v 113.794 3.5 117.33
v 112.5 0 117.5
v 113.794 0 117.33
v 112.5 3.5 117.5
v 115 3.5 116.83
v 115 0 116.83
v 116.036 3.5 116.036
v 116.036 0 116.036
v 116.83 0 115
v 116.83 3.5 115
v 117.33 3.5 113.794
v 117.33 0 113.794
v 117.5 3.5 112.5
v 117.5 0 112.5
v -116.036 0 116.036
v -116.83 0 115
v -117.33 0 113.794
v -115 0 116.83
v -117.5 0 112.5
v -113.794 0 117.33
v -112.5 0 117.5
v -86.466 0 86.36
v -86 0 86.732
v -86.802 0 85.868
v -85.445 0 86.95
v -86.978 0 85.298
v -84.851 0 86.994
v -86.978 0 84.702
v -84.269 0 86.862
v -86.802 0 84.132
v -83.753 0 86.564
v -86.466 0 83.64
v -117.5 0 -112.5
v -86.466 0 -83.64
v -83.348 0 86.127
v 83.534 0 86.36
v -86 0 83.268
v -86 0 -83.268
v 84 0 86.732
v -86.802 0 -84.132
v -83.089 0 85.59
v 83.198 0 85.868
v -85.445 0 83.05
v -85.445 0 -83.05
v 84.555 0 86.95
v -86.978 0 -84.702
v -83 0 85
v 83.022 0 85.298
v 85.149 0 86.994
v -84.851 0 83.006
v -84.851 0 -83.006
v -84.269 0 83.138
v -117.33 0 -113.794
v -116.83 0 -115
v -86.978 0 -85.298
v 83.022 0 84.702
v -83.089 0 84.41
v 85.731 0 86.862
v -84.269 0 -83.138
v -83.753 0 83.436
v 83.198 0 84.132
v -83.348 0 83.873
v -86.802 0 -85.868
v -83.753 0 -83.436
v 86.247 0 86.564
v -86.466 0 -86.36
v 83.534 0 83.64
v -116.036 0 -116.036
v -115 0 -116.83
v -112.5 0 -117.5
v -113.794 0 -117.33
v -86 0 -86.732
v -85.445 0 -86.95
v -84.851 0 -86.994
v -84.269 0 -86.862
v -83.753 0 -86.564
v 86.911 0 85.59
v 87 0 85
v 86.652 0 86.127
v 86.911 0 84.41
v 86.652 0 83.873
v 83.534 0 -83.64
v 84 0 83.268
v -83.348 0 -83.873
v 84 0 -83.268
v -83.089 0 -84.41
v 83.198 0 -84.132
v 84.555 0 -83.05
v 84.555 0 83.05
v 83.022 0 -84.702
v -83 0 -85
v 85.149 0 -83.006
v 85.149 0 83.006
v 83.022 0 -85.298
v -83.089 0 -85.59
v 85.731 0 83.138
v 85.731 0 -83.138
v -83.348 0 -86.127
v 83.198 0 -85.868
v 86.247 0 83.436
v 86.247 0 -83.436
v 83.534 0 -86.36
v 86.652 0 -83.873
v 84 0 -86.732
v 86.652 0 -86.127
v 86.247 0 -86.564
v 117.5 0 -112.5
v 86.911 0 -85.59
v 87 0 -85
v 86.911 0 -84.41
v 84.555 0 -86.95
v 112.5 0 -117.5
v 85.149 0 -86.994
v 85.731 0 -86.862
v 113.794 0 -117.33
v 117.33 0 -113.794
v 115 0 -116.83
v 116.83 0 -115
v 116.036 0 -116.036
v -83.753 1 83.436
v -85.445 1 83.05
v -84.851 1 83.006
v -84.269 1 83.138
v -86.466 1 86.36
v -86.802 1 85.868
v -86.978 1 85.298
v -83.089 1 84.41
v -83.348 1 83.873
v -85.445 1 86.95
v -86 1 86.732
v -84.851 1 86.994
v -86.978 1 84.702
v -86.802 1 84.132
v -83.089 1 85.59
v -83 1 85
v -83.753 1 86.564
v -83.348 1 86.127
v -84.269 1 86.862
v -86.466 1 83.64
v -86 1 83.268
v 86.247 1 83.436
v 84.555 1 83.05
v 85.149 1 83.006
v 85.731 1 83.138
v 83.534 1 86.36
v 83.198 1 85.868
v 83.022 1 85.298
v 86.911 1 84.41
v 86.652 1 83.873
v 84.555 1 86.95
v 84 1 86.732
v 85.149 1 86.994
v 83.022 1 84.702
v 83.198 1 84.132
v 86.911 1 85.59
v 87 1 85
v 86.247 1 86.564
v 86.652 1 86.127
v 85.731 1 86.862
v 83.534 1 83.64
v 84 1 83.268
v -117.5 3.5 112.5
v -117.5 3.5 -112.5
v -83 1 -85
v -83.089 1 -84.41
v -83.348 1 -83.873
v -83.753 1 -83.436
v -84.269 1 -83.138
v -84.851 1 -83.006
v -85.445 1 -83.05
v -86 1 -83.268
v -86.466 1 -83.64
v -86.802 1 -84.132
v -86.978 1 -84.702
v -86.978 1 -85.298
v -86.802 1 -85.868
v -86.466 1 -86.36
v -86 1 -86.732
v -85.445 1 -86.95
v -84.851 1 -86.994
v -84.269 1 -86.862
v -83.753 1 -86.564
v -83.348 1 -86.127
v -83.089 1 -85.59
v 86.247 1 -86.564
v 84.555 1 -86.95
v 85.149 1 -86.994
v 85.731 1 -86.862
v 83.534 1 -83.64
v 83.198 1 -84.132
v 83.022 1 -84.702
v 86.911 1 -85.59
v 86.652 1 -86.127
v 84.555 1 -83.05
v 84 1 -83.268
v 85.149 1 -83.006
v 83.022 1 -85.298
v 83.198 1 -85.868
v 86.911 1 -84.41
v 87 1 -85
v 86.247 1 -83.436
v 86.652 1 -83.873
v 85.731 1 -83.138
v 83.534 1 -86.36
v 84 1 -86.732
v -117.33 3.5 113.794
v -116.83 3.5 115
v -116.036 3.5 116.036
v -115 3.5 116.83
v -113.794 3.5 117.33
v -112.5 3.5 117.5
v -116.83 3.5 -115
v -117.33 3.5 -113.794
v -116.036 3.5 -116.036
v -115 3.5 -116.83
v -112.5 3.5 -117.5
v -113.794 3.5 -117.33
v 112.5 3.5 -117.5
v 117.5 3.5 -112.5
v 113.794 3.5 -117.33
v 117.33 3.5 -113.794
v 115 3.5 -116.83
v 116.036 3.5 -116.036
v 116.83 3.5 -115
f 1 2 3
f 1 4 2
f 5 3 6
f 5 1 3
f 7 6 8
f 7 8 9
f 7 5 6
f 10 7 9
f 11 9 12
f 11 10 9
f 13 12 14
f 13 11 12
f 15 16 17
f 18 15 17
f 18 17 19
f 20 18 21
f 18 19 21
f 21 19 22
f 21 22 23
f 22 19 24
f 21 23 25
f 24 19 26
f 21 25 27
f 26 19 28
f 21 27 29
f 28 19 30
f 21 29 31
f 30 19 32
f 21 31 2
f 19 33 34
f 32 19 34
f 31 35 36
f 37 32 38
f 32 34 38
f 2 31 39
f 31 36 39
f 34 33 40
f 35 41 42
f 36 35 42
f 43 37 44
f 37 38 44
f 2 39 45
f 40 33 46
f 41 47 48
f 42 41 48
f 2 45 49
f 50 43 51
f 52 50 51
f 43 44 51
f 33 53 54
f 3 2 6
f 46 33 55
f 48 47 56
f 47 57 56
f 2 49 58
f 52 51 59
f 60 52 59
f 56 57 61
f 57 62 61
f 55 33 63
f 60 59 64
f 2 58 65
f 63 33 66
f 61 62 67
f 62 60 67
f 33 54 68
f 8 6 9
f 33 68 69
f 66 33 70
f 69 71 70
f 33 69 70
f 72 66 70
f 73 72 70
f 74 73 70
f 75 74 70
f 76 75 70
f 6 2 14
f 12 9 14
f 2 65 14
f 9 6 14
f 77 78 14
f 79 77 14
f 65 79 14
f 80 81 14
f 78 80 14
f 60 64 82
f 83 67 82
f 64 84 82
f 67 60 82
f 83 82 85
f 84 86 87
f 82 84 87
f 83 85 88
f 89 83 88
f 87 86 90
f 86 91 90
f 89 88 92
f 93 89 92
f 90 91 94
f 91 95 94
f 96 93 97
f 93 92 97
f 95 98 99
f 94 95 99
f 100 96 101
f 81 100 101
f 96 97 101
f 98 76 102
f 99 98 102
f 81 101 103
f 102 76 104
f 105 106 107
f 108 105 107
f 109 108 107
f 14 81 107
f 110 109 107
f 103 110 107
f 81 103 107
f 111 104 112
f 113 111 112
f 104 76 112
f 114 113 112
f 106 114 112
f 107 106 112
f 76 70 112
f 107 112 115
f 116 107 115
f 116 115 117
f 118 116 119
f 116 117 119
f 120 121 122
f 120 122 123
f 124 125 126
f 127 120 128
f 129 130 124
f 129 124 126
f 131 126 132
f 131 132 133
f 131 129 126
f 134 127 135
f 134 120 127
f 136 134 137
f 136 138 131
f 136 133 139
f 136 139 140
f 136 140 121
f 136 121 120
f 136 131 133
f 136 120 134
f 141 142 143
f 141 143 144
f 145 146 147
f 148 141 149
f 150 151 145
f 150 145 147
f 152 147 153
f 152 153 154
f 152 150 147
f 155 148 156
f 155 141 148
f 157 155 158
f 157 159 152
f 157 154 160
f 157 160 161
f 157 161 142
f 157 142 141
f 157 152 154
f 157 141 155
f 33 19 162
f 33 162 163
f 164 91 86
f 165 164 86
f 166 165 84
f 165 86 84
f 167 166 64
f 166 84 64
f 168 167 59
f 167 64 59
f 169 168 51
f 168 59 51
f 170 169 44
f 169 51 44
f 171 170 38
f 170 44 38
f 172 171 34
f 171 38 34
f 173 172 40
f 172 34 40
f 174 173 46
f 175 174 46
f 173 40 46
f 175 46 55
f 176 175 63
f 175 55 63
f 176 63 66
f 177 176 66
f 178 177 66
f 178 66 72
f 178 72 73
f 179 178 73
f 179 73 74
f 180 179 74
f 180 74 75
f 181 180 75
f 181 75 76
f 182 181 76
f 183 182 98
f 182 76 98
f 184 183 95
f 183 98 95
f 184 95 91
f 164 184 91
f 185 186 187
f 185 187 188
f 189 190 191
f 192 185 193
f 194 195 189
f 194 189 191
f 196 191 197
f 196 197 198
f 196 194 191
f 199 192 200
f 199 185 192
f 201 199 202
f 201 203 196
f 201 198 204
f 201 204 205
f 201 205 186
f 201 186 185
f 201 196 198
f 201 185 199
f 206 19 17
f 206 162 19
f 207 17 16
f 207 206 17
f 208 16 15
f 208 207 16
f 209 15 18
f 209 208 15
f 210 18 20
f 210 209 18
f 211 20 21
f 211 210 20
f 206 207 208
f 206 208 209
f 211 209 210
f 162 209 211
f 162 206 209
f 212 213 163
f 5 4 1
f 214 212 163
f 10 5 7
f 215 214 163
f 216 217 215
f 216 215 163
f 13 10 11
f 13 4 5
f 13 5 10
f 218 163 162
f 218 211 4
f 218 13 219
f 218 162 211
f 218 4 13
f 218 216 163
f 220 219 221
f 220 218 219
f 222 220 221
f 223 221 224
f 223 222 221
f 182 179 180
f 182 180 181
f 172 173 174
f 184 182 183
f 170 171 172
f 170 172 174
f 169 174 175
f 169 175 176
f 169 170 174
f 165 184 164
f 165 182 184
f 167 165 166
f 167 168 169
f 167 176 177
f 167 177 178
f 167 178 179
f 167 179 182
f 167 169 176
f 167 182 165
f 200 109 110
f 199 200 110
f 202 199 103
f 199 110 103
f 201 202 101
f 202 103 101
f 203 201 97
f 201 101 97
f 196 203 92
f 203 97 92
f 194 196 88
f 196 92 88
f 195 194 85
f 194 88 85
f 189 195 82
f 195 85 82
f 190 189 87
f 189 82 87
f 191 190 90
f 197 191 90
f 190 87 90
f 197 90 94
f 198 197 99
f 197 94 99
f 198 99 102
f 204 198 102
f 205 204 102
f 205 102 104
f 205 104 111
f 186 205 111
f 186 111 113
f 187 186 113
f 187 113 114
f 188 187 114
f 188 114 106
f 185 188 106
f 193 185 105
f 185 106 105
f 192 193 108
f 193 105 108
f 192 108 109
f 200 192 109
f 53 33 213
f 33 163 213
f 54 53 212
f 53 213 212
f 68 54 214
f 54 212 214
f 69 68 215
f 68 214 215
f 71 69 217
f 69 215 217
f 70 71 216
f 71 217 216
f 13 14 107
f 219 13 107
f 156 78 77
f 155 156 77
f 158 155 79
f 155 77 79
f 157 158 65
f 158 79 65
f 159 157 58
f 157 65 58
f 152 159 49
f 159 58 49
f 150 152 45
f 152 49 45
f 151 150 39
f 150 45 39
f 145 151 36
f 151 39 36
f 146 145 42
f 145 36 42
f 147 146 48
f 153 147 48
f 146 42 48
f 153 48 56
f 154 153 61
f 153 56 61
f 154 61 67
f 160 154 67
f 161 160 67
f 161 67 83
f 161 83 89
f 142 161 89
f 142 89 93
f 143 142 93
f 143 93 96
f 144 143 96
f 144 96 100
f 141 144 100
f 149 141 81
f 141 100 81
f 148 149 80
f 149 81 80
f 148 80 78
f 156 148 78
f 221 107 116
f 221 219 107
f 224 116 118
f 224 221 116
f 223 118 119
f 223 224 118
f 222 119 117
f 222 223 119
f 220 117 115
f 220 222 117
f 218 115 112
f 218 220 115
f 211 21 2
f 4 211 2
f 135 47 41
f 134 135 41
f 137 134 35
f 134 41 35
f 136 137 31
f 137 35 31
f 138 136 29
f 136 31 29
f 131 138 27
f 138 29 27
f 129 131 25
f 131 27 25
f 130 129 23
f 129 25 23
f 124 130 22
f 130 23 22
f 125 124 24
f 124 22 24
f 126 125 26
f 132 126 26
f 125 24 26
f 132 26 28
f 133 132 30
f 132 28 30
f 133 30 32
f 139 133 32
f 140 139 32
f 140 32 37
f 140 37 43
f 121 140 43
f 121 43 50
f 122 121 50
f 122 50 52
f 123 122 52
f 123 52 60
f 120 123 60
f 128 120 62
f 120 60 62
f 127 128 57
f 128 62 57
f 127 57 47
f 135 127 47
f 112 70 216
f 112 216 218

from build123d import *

# Parameters (mm, degrees)
SKETCH1_W            = 235
SKETCH1_H            = 235
BOSS_EXTRUDE1_DEPTH  = 3.5
FILLET1_R            = 5
SKETCH2_R            = 2
CUT_EXTRUDE1_DEPTH   = 1
LPATTERN1_COUNT      = 2
LPATTERN1_PITCH      = 170
LPATTERN1_COUNT_DIR2 = 2
LPATTERN1_PITCH_DIR2 = 170


with BuildPart() as part:
    # Sketch1 → Boss-Extrude1 (new body)
    with BuildSketch(Plane(origin=(0, 0, 0), x_dir=(1, 0, 0), z_dir=(0, 1, 0))):
        Rectangle(SKETCH1_W, SKETCH1_H)
    extrude(amount=BOSS_EXTRUDE1_DEPTH)

    # Fillet1
    fillet1_edges = [part.edges().sort_by_distance(p)[0] for p in [
        (-117.5, 1.75, -117.5),
        (117.5, 1.75, -117.5),
        (117.5, 1.75, 117.5),
        (-117.5, 1.75, 117.5),
    ]]
    fillet(fillet1_edges, radius=FILLET1_R)

    # Sketch2 → Cut-Extrude1 (cut)
    with BuildSketch(Plane.XZ):
        with Locations((-85, -85)):
            Circle(SKETCH2_R)
    cut_extrude1 = extrude(amount=-CUT_EXTRUDE1_DEPTH, mode=Mode.SUBTRACT)

    # LPattern1: Cut-Extrude1 2 × 2
    with Locations(*[(j * LPATTERN1_PITCH_DIR2, 0, i * LPATTERN1_PITCH) for i in range(LPATTERN1_COUNT) for j in range(LPATTERN1_COUNT_DIR2) if (i, j) != (0, 0)]):
        add(cut_extrude1, mode=Mode.SUBTRACT)


solid = part.part
